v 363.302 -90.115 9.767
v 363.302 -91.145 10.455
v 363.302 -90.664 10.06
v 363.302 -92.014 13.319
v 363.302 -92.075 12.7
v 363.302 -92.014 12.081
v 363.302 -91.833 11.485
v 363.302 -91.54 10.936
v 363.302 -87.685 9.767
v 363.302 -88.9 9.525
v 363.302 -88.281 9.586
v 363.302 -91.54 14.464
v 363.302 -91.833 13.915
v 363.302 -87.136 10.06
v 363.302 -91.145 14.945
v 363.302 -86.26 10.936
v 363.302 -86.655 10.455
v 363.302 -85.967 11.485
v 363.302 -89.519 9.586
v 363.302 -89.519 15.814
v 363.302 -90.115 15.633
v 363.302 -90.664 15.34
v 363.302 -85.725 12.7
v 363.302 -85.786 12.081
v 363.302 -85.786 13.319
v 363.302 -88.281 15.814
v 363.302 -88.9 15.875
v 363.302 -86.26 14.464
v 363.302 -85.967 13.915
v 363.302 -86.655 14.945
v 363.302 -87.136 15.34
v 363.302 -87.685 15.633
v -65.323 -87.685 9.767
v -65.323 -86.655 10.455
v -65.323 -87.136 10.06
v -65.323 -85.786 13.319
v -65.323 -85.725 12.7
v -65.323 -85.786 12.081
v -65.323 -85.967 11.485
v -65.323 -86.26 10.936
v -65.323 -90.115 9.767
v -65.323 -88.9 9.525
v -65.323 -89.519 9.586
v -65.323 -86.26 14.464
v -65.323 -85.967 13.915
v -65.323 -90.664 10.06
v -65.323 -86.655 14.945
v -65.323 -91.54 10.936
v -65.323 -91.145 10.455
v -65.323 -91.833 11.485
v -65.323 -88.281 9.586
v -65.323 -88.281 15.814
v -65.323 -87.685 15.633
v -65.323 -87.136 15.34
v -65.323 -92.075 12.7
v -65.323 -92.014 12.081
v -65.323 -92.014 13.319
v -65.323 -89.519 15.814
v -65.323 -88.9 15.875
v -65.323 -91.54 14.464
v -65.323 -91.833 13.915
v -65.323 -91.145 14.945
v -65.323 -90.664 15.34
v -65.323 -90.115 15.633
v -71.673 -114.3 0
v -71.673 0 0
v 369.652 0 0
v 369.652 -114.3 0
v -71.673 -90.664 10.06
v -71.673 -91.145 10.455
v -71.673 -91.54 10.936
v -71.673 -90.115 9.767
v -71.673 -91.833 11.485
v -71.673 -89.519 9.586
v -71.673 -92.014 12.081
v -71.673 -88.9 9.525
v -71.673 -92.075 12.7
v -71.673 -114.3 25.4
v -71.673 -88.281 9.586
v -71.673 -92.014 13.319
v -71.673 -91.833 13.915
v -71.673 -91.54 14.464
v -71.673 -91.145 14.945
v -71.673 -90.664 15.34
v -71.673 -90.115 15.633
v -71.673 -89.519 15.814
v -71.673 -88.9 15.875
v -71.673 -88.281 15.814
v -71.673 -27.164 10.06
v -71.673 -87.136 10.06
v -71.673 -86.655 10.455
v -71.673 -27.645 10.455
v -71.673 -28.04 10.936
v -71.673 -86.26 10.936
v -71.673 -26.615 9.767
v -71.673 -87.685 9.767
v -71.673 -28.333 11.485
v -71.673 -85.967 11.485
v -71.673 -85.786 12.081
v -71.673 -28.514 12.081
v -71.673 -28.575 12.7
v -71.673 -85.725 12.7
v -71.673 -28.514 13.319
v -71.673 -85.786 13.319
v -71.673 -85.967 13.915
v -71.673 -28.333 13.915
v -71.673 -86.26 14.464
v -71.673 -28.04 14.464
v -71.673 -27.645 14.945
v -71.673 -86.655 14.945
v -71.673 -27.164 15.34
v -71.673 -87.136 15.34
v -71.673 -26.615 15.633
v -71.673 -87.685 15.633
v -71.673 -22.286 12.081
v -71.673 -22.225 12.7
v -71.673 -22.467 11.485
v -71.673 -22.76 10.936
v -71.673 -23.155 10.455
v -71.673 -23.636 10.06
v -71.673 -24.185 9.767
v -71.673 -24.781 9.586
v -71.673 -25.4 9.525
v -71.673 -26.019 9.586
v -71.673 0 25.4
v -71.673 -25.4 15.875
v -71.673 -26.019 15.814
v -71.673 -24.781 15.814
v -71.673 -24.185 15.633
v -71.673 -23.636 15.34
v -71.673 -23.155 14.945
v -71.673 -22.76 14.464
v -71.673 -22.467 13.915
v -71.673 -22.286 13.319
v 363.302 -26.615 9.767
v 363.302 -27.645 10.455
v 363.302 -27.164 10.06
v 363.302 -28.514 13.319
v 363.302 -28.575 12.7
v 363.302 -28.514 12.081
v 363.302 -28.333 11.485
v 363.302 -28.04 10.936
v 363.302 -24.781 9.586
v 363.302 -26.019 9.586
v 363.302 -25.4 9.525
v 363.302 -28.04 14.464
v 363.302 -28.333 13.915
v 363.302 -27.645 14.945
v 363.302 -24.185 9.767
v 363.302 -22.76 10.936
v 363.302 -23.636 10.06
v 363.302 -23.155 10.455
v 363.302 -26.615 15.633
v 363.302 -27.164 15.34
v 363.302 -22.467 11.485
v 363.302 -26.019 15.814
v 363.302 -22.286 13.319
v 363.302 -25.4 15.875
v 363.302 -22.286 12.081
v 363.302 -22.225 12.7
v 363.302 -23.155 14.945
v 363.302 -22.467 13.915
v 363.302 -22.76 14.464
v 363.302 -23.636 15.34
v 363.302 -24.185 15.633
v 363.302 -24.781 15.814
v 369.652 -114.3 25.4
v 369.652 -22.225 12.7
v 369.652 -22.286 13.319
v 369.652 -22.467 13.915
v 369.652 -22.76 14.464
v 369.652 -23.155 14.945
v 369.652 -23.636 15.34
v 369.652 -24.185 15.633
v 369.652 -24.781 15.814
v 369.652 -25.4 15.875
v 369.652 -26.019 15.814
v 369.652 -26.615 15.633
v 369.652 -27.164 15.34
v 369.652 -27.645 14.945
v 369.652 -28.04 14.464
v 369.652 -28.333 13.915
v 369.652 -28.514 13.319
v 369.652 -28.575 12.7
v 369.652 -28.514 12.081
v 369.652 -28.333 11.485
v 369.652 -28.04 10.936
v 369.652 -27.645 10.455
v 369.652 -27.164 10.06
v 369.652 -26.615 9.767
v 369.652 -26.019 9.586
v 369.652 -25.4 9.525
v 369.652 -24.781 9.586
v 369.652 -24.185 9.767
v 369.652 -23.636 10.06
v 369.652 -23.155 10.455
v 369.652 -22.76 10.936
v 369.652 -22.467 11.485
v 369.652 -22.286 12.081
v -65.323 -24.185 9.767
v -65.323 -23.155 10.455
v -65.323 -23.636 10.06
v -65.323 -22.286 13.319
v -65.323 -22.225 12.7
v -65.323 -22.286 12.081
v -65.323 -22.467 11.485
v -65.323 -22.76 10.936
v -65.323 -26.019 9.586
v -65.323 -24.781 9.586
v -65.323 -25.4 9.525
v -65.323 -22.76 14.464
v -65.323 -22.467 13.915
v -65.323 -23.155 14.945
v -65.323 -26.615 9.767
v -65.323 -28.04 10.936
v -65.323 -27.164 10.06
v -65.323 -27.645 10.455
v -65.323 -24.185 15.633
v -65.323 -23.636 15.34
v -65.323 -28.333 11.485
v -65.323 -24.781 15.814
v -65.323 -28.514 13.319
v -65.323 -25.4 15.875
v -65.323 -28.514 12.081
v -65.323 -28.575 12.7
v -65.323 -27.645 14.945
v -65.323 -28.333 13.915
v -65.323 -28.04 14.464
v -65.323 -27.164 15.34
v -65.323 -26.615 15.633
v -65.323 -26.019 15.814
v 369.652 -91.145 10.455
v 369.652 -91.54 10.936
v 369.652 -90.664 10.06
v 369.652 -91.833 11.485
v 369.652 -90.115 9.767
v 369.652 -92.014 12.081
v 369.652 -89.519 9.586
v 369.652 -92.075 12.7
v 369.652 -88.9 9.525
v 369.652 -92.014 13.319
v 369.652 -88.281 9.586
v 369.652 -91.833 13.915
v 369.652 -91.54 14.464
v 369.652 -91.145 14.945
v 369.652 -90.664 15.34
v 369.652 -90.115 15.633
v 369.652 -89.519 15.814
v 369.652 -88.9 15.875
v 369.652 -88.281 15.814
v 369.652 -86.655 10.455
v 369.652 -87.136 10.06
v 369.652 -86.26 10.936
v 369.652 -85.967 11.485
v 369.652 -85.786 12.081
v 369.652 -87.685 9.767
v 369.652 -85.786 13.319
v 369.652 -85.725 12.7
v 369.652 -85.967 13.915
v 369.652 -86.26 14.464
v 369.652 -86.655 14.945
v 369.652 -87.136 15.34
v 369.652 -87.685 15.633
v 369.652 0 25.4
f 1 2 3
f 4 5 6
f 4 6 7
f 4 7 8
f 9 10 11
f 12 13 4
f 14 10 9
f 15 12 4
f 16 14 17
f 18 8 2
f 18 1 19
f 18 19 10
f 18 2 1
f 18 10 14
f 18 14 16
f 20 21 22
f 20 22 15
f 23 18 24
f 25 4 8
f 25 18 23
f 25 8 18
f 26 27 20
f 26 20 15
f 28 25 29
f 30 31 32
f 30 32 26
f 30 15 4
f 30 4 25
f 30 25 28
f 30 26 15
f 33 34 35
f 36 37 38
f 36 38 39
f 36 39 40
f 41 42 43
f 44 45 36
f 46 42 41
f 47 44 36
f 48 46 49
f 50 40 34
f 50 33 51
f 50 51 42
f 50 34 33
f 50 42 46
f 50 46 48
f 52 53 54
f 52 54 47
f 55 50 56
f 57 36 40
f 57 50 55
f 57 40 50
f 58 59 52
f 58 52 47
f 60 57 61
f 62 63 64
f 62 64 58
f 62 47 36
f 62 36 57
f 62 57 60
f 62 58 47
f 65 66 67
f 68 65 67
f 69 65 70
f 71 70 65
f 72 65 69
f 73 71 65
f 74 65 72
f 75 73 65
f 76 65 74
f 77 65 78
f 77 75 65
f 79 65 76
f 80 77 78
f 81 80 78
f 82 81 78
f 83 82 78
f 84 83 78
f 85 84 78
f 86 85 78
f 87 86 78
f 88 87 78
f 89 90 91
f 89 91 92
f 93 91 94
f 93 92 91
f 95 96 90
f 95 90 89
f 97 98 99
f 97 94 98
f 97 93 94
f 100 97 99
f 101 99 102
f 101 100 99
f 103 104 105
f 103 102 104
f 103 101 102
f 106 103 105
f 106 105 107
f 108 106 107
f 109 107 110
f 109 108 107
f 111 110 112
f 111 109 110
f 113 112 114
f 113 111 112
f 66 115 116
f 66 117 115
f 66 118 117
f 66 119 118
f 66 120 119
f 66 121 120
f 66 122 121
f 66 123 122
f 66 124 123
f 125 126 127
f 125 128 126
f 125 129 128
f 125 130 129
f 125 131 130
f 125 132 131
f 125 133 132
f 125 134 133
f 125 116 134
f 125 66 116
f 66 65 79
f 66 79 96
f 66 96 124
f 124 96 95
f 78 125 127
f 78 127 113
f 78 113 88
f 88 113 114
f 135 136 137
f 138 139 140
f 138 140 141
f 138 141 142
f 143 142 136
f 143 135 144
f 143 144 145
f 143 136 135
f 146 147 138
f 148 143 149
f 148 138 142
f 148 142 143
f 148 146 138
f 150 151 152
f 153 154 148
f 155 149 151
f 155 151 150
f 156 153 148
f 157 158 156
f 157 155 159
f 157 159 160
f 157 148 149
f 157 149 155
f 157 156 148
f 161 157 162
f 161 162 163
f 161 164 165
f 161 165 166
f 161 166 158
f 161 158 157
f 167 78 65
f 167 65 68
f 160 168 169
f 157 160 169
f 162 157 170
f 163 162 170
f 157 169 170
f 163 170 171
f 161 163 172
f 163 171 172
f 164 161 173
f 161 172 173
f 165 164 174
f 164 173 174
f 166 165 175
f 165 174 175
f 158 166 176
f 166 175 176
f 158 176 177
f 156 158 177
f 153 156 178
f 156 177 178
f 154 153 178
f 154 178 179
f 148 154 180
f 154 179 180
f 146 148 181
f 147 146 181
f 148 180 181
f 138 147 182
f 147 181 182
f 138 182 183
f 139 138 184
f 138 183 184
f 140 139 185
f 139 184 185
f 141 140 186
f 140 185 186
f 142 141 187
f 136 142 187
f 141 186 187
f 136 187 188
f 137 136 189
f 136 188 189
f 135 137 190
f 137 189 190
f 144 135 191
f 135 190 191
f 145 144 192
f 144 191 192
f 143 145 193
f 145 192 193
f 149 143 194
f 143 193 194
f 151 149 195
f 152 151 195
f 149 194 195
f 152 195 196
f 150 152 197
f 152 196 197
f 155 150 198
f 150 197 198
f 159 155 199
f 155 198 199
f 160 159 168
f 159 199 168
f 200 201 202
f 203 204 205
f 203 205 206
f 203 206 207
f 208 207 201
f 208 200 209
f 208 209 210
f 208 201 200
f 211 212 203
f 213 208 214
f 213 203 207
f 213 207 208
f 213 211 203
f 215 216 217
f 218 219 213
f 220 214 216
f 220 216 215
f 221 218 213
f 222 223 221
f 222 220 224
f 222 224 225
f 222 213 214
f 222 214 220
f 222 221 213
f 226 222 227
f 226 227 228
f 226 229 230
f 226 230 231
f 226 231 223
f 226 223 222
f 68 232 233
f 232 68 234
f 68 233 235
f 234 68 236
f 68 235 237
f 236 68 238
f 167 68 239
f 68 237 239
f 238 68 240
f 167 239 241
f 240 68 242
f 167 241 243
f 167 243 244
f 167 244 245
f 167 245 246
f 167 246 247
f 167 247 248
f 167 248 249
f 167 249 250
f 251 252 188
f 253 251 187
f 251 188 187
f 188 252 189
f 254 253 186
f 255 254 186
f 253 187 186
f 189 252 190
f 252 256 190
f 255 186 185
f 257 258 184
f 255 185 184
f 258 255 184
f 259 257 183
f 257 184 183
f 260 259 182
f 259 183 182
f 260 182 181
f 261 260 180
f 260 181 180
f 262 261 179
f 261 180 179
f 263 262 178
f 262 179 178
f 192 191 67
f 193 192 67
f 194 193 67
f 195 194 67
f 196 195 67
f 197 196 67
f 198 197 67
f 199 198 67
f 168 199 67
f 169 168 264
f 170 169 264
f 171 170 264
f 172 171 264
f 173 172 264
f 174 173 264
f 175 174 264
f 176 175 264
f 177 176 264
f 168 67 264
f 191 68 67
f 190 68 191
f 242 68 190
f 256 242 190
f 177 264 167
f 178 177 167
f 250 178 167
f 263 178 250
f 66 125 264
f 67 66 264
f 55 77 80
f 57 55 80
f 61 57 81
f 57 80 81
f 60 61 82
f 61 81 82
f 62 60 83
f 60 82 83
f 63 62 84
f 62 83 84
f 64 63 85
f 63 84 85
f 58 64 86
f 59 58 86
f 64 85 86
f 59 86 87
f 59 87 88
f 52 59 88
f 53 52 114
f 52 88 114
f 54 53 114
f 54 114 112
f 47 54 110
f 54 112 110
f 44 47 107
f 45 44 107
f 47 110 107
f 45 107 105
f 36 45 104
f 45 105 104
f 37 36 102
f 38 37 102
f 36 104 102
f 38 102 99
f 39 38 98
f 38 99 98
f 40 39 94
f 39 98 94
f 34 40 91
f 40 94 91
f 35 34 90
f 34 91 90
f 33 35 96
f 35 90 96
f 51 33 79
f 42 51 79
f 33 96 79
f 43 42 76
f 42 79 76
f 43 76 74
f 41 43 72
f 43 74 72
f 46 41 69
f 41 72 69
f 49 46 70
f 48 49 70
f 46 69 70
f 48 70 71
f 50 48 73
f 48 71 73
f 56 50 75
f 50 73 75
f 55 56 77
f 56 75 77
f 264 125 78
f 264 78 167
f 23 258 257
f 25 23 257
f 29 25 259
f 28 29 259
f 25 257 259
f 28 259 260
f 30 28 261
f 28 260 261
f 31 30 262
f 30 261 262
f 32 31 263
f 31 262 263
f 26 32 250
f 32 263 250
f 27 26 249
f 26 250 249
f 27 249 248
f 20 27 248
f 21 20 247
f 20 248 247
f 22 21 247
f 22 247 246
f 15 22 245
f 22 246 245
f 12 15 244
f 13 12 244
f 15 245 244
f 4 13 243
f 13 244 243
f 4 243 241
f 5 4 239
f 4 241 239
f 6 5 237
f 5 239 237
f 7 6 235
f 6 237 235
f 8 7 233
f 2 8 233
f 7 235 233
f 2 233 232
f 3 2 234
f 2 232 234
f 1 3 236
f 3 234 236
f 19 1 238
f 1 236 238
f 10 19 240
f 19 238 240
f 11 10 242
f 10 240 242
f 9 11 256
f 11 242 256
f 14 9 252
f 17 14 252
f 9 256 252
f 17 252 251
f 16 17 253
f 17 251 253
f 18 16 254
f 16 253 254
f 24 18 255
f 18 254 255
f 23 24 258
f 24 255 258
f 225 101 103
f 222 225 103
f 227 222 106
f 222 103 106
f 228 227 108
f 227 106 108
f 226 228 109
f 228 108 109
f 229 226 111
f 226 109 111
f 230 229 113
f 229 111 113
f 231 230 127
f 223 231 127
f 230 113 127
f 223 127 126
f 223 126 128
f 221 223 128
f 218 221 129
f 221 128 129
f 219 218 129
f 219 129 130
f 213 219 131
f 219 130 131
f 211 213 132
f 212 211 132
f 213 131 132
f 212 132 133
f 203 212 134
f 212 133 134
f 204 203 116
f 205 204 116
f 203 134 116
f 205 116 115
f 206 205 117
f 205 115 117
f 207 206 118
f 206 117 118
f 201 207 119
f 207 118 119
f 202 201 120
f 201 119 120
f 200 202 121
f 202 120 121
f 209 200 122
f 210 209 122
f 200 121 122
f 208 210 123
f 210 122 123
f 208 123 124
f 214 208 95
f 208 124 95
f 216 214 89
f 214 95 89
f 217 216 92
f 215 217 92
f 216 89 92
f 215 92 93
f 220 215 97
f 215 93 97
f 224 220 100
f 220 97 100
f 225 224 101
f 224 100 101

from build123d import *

# Parameters (mm, degrees)
F0_W     = 441.325
F0_H     = 25.4
F1_DEPTH = 114.3
F3_R     = 3.175
F4_DEPTH = 6.35
F2_R     = 3.175
F5_DEPTH = 6.35


with BuildPart() as f1:
    # F0 (on Front) → F1 (new body)
    with BuildSketch(Plane.XZ):
        with Locations((148.989234, 12.7)):
            Rectangle(F0_W, F0_H)
    extrude(amount=F1_DEPTH)

    # F3 (on face) → F4 (cut)
    with BuildSketch(Plane.YZ.offset(369.651734)):
        with Locations((-88.9, 12.7)):
            Circle(F3_R)
        with Locations((-25.4, 12.7)):
            Circle(F3_R)
    extrude(amount=-F4_DEPTH, mode=Mode.SUBTRACT)

    # F2 (on face) → F5 (cut)
    with BuildSketch(Plane(origin=(-71.673266, 0, 0), x_dir=(0, -1, 0), z_dir=(-1, 0, 0))):
        with Locations((25.4, 12.7)):
            Circle(F2_R)
        with Locations((88.9, 12.7)):
            Circle(F2_R)
    extrude(amount=-F5_DEPTH, mode=Mode.SUBTRACT)


solid = f1.part
